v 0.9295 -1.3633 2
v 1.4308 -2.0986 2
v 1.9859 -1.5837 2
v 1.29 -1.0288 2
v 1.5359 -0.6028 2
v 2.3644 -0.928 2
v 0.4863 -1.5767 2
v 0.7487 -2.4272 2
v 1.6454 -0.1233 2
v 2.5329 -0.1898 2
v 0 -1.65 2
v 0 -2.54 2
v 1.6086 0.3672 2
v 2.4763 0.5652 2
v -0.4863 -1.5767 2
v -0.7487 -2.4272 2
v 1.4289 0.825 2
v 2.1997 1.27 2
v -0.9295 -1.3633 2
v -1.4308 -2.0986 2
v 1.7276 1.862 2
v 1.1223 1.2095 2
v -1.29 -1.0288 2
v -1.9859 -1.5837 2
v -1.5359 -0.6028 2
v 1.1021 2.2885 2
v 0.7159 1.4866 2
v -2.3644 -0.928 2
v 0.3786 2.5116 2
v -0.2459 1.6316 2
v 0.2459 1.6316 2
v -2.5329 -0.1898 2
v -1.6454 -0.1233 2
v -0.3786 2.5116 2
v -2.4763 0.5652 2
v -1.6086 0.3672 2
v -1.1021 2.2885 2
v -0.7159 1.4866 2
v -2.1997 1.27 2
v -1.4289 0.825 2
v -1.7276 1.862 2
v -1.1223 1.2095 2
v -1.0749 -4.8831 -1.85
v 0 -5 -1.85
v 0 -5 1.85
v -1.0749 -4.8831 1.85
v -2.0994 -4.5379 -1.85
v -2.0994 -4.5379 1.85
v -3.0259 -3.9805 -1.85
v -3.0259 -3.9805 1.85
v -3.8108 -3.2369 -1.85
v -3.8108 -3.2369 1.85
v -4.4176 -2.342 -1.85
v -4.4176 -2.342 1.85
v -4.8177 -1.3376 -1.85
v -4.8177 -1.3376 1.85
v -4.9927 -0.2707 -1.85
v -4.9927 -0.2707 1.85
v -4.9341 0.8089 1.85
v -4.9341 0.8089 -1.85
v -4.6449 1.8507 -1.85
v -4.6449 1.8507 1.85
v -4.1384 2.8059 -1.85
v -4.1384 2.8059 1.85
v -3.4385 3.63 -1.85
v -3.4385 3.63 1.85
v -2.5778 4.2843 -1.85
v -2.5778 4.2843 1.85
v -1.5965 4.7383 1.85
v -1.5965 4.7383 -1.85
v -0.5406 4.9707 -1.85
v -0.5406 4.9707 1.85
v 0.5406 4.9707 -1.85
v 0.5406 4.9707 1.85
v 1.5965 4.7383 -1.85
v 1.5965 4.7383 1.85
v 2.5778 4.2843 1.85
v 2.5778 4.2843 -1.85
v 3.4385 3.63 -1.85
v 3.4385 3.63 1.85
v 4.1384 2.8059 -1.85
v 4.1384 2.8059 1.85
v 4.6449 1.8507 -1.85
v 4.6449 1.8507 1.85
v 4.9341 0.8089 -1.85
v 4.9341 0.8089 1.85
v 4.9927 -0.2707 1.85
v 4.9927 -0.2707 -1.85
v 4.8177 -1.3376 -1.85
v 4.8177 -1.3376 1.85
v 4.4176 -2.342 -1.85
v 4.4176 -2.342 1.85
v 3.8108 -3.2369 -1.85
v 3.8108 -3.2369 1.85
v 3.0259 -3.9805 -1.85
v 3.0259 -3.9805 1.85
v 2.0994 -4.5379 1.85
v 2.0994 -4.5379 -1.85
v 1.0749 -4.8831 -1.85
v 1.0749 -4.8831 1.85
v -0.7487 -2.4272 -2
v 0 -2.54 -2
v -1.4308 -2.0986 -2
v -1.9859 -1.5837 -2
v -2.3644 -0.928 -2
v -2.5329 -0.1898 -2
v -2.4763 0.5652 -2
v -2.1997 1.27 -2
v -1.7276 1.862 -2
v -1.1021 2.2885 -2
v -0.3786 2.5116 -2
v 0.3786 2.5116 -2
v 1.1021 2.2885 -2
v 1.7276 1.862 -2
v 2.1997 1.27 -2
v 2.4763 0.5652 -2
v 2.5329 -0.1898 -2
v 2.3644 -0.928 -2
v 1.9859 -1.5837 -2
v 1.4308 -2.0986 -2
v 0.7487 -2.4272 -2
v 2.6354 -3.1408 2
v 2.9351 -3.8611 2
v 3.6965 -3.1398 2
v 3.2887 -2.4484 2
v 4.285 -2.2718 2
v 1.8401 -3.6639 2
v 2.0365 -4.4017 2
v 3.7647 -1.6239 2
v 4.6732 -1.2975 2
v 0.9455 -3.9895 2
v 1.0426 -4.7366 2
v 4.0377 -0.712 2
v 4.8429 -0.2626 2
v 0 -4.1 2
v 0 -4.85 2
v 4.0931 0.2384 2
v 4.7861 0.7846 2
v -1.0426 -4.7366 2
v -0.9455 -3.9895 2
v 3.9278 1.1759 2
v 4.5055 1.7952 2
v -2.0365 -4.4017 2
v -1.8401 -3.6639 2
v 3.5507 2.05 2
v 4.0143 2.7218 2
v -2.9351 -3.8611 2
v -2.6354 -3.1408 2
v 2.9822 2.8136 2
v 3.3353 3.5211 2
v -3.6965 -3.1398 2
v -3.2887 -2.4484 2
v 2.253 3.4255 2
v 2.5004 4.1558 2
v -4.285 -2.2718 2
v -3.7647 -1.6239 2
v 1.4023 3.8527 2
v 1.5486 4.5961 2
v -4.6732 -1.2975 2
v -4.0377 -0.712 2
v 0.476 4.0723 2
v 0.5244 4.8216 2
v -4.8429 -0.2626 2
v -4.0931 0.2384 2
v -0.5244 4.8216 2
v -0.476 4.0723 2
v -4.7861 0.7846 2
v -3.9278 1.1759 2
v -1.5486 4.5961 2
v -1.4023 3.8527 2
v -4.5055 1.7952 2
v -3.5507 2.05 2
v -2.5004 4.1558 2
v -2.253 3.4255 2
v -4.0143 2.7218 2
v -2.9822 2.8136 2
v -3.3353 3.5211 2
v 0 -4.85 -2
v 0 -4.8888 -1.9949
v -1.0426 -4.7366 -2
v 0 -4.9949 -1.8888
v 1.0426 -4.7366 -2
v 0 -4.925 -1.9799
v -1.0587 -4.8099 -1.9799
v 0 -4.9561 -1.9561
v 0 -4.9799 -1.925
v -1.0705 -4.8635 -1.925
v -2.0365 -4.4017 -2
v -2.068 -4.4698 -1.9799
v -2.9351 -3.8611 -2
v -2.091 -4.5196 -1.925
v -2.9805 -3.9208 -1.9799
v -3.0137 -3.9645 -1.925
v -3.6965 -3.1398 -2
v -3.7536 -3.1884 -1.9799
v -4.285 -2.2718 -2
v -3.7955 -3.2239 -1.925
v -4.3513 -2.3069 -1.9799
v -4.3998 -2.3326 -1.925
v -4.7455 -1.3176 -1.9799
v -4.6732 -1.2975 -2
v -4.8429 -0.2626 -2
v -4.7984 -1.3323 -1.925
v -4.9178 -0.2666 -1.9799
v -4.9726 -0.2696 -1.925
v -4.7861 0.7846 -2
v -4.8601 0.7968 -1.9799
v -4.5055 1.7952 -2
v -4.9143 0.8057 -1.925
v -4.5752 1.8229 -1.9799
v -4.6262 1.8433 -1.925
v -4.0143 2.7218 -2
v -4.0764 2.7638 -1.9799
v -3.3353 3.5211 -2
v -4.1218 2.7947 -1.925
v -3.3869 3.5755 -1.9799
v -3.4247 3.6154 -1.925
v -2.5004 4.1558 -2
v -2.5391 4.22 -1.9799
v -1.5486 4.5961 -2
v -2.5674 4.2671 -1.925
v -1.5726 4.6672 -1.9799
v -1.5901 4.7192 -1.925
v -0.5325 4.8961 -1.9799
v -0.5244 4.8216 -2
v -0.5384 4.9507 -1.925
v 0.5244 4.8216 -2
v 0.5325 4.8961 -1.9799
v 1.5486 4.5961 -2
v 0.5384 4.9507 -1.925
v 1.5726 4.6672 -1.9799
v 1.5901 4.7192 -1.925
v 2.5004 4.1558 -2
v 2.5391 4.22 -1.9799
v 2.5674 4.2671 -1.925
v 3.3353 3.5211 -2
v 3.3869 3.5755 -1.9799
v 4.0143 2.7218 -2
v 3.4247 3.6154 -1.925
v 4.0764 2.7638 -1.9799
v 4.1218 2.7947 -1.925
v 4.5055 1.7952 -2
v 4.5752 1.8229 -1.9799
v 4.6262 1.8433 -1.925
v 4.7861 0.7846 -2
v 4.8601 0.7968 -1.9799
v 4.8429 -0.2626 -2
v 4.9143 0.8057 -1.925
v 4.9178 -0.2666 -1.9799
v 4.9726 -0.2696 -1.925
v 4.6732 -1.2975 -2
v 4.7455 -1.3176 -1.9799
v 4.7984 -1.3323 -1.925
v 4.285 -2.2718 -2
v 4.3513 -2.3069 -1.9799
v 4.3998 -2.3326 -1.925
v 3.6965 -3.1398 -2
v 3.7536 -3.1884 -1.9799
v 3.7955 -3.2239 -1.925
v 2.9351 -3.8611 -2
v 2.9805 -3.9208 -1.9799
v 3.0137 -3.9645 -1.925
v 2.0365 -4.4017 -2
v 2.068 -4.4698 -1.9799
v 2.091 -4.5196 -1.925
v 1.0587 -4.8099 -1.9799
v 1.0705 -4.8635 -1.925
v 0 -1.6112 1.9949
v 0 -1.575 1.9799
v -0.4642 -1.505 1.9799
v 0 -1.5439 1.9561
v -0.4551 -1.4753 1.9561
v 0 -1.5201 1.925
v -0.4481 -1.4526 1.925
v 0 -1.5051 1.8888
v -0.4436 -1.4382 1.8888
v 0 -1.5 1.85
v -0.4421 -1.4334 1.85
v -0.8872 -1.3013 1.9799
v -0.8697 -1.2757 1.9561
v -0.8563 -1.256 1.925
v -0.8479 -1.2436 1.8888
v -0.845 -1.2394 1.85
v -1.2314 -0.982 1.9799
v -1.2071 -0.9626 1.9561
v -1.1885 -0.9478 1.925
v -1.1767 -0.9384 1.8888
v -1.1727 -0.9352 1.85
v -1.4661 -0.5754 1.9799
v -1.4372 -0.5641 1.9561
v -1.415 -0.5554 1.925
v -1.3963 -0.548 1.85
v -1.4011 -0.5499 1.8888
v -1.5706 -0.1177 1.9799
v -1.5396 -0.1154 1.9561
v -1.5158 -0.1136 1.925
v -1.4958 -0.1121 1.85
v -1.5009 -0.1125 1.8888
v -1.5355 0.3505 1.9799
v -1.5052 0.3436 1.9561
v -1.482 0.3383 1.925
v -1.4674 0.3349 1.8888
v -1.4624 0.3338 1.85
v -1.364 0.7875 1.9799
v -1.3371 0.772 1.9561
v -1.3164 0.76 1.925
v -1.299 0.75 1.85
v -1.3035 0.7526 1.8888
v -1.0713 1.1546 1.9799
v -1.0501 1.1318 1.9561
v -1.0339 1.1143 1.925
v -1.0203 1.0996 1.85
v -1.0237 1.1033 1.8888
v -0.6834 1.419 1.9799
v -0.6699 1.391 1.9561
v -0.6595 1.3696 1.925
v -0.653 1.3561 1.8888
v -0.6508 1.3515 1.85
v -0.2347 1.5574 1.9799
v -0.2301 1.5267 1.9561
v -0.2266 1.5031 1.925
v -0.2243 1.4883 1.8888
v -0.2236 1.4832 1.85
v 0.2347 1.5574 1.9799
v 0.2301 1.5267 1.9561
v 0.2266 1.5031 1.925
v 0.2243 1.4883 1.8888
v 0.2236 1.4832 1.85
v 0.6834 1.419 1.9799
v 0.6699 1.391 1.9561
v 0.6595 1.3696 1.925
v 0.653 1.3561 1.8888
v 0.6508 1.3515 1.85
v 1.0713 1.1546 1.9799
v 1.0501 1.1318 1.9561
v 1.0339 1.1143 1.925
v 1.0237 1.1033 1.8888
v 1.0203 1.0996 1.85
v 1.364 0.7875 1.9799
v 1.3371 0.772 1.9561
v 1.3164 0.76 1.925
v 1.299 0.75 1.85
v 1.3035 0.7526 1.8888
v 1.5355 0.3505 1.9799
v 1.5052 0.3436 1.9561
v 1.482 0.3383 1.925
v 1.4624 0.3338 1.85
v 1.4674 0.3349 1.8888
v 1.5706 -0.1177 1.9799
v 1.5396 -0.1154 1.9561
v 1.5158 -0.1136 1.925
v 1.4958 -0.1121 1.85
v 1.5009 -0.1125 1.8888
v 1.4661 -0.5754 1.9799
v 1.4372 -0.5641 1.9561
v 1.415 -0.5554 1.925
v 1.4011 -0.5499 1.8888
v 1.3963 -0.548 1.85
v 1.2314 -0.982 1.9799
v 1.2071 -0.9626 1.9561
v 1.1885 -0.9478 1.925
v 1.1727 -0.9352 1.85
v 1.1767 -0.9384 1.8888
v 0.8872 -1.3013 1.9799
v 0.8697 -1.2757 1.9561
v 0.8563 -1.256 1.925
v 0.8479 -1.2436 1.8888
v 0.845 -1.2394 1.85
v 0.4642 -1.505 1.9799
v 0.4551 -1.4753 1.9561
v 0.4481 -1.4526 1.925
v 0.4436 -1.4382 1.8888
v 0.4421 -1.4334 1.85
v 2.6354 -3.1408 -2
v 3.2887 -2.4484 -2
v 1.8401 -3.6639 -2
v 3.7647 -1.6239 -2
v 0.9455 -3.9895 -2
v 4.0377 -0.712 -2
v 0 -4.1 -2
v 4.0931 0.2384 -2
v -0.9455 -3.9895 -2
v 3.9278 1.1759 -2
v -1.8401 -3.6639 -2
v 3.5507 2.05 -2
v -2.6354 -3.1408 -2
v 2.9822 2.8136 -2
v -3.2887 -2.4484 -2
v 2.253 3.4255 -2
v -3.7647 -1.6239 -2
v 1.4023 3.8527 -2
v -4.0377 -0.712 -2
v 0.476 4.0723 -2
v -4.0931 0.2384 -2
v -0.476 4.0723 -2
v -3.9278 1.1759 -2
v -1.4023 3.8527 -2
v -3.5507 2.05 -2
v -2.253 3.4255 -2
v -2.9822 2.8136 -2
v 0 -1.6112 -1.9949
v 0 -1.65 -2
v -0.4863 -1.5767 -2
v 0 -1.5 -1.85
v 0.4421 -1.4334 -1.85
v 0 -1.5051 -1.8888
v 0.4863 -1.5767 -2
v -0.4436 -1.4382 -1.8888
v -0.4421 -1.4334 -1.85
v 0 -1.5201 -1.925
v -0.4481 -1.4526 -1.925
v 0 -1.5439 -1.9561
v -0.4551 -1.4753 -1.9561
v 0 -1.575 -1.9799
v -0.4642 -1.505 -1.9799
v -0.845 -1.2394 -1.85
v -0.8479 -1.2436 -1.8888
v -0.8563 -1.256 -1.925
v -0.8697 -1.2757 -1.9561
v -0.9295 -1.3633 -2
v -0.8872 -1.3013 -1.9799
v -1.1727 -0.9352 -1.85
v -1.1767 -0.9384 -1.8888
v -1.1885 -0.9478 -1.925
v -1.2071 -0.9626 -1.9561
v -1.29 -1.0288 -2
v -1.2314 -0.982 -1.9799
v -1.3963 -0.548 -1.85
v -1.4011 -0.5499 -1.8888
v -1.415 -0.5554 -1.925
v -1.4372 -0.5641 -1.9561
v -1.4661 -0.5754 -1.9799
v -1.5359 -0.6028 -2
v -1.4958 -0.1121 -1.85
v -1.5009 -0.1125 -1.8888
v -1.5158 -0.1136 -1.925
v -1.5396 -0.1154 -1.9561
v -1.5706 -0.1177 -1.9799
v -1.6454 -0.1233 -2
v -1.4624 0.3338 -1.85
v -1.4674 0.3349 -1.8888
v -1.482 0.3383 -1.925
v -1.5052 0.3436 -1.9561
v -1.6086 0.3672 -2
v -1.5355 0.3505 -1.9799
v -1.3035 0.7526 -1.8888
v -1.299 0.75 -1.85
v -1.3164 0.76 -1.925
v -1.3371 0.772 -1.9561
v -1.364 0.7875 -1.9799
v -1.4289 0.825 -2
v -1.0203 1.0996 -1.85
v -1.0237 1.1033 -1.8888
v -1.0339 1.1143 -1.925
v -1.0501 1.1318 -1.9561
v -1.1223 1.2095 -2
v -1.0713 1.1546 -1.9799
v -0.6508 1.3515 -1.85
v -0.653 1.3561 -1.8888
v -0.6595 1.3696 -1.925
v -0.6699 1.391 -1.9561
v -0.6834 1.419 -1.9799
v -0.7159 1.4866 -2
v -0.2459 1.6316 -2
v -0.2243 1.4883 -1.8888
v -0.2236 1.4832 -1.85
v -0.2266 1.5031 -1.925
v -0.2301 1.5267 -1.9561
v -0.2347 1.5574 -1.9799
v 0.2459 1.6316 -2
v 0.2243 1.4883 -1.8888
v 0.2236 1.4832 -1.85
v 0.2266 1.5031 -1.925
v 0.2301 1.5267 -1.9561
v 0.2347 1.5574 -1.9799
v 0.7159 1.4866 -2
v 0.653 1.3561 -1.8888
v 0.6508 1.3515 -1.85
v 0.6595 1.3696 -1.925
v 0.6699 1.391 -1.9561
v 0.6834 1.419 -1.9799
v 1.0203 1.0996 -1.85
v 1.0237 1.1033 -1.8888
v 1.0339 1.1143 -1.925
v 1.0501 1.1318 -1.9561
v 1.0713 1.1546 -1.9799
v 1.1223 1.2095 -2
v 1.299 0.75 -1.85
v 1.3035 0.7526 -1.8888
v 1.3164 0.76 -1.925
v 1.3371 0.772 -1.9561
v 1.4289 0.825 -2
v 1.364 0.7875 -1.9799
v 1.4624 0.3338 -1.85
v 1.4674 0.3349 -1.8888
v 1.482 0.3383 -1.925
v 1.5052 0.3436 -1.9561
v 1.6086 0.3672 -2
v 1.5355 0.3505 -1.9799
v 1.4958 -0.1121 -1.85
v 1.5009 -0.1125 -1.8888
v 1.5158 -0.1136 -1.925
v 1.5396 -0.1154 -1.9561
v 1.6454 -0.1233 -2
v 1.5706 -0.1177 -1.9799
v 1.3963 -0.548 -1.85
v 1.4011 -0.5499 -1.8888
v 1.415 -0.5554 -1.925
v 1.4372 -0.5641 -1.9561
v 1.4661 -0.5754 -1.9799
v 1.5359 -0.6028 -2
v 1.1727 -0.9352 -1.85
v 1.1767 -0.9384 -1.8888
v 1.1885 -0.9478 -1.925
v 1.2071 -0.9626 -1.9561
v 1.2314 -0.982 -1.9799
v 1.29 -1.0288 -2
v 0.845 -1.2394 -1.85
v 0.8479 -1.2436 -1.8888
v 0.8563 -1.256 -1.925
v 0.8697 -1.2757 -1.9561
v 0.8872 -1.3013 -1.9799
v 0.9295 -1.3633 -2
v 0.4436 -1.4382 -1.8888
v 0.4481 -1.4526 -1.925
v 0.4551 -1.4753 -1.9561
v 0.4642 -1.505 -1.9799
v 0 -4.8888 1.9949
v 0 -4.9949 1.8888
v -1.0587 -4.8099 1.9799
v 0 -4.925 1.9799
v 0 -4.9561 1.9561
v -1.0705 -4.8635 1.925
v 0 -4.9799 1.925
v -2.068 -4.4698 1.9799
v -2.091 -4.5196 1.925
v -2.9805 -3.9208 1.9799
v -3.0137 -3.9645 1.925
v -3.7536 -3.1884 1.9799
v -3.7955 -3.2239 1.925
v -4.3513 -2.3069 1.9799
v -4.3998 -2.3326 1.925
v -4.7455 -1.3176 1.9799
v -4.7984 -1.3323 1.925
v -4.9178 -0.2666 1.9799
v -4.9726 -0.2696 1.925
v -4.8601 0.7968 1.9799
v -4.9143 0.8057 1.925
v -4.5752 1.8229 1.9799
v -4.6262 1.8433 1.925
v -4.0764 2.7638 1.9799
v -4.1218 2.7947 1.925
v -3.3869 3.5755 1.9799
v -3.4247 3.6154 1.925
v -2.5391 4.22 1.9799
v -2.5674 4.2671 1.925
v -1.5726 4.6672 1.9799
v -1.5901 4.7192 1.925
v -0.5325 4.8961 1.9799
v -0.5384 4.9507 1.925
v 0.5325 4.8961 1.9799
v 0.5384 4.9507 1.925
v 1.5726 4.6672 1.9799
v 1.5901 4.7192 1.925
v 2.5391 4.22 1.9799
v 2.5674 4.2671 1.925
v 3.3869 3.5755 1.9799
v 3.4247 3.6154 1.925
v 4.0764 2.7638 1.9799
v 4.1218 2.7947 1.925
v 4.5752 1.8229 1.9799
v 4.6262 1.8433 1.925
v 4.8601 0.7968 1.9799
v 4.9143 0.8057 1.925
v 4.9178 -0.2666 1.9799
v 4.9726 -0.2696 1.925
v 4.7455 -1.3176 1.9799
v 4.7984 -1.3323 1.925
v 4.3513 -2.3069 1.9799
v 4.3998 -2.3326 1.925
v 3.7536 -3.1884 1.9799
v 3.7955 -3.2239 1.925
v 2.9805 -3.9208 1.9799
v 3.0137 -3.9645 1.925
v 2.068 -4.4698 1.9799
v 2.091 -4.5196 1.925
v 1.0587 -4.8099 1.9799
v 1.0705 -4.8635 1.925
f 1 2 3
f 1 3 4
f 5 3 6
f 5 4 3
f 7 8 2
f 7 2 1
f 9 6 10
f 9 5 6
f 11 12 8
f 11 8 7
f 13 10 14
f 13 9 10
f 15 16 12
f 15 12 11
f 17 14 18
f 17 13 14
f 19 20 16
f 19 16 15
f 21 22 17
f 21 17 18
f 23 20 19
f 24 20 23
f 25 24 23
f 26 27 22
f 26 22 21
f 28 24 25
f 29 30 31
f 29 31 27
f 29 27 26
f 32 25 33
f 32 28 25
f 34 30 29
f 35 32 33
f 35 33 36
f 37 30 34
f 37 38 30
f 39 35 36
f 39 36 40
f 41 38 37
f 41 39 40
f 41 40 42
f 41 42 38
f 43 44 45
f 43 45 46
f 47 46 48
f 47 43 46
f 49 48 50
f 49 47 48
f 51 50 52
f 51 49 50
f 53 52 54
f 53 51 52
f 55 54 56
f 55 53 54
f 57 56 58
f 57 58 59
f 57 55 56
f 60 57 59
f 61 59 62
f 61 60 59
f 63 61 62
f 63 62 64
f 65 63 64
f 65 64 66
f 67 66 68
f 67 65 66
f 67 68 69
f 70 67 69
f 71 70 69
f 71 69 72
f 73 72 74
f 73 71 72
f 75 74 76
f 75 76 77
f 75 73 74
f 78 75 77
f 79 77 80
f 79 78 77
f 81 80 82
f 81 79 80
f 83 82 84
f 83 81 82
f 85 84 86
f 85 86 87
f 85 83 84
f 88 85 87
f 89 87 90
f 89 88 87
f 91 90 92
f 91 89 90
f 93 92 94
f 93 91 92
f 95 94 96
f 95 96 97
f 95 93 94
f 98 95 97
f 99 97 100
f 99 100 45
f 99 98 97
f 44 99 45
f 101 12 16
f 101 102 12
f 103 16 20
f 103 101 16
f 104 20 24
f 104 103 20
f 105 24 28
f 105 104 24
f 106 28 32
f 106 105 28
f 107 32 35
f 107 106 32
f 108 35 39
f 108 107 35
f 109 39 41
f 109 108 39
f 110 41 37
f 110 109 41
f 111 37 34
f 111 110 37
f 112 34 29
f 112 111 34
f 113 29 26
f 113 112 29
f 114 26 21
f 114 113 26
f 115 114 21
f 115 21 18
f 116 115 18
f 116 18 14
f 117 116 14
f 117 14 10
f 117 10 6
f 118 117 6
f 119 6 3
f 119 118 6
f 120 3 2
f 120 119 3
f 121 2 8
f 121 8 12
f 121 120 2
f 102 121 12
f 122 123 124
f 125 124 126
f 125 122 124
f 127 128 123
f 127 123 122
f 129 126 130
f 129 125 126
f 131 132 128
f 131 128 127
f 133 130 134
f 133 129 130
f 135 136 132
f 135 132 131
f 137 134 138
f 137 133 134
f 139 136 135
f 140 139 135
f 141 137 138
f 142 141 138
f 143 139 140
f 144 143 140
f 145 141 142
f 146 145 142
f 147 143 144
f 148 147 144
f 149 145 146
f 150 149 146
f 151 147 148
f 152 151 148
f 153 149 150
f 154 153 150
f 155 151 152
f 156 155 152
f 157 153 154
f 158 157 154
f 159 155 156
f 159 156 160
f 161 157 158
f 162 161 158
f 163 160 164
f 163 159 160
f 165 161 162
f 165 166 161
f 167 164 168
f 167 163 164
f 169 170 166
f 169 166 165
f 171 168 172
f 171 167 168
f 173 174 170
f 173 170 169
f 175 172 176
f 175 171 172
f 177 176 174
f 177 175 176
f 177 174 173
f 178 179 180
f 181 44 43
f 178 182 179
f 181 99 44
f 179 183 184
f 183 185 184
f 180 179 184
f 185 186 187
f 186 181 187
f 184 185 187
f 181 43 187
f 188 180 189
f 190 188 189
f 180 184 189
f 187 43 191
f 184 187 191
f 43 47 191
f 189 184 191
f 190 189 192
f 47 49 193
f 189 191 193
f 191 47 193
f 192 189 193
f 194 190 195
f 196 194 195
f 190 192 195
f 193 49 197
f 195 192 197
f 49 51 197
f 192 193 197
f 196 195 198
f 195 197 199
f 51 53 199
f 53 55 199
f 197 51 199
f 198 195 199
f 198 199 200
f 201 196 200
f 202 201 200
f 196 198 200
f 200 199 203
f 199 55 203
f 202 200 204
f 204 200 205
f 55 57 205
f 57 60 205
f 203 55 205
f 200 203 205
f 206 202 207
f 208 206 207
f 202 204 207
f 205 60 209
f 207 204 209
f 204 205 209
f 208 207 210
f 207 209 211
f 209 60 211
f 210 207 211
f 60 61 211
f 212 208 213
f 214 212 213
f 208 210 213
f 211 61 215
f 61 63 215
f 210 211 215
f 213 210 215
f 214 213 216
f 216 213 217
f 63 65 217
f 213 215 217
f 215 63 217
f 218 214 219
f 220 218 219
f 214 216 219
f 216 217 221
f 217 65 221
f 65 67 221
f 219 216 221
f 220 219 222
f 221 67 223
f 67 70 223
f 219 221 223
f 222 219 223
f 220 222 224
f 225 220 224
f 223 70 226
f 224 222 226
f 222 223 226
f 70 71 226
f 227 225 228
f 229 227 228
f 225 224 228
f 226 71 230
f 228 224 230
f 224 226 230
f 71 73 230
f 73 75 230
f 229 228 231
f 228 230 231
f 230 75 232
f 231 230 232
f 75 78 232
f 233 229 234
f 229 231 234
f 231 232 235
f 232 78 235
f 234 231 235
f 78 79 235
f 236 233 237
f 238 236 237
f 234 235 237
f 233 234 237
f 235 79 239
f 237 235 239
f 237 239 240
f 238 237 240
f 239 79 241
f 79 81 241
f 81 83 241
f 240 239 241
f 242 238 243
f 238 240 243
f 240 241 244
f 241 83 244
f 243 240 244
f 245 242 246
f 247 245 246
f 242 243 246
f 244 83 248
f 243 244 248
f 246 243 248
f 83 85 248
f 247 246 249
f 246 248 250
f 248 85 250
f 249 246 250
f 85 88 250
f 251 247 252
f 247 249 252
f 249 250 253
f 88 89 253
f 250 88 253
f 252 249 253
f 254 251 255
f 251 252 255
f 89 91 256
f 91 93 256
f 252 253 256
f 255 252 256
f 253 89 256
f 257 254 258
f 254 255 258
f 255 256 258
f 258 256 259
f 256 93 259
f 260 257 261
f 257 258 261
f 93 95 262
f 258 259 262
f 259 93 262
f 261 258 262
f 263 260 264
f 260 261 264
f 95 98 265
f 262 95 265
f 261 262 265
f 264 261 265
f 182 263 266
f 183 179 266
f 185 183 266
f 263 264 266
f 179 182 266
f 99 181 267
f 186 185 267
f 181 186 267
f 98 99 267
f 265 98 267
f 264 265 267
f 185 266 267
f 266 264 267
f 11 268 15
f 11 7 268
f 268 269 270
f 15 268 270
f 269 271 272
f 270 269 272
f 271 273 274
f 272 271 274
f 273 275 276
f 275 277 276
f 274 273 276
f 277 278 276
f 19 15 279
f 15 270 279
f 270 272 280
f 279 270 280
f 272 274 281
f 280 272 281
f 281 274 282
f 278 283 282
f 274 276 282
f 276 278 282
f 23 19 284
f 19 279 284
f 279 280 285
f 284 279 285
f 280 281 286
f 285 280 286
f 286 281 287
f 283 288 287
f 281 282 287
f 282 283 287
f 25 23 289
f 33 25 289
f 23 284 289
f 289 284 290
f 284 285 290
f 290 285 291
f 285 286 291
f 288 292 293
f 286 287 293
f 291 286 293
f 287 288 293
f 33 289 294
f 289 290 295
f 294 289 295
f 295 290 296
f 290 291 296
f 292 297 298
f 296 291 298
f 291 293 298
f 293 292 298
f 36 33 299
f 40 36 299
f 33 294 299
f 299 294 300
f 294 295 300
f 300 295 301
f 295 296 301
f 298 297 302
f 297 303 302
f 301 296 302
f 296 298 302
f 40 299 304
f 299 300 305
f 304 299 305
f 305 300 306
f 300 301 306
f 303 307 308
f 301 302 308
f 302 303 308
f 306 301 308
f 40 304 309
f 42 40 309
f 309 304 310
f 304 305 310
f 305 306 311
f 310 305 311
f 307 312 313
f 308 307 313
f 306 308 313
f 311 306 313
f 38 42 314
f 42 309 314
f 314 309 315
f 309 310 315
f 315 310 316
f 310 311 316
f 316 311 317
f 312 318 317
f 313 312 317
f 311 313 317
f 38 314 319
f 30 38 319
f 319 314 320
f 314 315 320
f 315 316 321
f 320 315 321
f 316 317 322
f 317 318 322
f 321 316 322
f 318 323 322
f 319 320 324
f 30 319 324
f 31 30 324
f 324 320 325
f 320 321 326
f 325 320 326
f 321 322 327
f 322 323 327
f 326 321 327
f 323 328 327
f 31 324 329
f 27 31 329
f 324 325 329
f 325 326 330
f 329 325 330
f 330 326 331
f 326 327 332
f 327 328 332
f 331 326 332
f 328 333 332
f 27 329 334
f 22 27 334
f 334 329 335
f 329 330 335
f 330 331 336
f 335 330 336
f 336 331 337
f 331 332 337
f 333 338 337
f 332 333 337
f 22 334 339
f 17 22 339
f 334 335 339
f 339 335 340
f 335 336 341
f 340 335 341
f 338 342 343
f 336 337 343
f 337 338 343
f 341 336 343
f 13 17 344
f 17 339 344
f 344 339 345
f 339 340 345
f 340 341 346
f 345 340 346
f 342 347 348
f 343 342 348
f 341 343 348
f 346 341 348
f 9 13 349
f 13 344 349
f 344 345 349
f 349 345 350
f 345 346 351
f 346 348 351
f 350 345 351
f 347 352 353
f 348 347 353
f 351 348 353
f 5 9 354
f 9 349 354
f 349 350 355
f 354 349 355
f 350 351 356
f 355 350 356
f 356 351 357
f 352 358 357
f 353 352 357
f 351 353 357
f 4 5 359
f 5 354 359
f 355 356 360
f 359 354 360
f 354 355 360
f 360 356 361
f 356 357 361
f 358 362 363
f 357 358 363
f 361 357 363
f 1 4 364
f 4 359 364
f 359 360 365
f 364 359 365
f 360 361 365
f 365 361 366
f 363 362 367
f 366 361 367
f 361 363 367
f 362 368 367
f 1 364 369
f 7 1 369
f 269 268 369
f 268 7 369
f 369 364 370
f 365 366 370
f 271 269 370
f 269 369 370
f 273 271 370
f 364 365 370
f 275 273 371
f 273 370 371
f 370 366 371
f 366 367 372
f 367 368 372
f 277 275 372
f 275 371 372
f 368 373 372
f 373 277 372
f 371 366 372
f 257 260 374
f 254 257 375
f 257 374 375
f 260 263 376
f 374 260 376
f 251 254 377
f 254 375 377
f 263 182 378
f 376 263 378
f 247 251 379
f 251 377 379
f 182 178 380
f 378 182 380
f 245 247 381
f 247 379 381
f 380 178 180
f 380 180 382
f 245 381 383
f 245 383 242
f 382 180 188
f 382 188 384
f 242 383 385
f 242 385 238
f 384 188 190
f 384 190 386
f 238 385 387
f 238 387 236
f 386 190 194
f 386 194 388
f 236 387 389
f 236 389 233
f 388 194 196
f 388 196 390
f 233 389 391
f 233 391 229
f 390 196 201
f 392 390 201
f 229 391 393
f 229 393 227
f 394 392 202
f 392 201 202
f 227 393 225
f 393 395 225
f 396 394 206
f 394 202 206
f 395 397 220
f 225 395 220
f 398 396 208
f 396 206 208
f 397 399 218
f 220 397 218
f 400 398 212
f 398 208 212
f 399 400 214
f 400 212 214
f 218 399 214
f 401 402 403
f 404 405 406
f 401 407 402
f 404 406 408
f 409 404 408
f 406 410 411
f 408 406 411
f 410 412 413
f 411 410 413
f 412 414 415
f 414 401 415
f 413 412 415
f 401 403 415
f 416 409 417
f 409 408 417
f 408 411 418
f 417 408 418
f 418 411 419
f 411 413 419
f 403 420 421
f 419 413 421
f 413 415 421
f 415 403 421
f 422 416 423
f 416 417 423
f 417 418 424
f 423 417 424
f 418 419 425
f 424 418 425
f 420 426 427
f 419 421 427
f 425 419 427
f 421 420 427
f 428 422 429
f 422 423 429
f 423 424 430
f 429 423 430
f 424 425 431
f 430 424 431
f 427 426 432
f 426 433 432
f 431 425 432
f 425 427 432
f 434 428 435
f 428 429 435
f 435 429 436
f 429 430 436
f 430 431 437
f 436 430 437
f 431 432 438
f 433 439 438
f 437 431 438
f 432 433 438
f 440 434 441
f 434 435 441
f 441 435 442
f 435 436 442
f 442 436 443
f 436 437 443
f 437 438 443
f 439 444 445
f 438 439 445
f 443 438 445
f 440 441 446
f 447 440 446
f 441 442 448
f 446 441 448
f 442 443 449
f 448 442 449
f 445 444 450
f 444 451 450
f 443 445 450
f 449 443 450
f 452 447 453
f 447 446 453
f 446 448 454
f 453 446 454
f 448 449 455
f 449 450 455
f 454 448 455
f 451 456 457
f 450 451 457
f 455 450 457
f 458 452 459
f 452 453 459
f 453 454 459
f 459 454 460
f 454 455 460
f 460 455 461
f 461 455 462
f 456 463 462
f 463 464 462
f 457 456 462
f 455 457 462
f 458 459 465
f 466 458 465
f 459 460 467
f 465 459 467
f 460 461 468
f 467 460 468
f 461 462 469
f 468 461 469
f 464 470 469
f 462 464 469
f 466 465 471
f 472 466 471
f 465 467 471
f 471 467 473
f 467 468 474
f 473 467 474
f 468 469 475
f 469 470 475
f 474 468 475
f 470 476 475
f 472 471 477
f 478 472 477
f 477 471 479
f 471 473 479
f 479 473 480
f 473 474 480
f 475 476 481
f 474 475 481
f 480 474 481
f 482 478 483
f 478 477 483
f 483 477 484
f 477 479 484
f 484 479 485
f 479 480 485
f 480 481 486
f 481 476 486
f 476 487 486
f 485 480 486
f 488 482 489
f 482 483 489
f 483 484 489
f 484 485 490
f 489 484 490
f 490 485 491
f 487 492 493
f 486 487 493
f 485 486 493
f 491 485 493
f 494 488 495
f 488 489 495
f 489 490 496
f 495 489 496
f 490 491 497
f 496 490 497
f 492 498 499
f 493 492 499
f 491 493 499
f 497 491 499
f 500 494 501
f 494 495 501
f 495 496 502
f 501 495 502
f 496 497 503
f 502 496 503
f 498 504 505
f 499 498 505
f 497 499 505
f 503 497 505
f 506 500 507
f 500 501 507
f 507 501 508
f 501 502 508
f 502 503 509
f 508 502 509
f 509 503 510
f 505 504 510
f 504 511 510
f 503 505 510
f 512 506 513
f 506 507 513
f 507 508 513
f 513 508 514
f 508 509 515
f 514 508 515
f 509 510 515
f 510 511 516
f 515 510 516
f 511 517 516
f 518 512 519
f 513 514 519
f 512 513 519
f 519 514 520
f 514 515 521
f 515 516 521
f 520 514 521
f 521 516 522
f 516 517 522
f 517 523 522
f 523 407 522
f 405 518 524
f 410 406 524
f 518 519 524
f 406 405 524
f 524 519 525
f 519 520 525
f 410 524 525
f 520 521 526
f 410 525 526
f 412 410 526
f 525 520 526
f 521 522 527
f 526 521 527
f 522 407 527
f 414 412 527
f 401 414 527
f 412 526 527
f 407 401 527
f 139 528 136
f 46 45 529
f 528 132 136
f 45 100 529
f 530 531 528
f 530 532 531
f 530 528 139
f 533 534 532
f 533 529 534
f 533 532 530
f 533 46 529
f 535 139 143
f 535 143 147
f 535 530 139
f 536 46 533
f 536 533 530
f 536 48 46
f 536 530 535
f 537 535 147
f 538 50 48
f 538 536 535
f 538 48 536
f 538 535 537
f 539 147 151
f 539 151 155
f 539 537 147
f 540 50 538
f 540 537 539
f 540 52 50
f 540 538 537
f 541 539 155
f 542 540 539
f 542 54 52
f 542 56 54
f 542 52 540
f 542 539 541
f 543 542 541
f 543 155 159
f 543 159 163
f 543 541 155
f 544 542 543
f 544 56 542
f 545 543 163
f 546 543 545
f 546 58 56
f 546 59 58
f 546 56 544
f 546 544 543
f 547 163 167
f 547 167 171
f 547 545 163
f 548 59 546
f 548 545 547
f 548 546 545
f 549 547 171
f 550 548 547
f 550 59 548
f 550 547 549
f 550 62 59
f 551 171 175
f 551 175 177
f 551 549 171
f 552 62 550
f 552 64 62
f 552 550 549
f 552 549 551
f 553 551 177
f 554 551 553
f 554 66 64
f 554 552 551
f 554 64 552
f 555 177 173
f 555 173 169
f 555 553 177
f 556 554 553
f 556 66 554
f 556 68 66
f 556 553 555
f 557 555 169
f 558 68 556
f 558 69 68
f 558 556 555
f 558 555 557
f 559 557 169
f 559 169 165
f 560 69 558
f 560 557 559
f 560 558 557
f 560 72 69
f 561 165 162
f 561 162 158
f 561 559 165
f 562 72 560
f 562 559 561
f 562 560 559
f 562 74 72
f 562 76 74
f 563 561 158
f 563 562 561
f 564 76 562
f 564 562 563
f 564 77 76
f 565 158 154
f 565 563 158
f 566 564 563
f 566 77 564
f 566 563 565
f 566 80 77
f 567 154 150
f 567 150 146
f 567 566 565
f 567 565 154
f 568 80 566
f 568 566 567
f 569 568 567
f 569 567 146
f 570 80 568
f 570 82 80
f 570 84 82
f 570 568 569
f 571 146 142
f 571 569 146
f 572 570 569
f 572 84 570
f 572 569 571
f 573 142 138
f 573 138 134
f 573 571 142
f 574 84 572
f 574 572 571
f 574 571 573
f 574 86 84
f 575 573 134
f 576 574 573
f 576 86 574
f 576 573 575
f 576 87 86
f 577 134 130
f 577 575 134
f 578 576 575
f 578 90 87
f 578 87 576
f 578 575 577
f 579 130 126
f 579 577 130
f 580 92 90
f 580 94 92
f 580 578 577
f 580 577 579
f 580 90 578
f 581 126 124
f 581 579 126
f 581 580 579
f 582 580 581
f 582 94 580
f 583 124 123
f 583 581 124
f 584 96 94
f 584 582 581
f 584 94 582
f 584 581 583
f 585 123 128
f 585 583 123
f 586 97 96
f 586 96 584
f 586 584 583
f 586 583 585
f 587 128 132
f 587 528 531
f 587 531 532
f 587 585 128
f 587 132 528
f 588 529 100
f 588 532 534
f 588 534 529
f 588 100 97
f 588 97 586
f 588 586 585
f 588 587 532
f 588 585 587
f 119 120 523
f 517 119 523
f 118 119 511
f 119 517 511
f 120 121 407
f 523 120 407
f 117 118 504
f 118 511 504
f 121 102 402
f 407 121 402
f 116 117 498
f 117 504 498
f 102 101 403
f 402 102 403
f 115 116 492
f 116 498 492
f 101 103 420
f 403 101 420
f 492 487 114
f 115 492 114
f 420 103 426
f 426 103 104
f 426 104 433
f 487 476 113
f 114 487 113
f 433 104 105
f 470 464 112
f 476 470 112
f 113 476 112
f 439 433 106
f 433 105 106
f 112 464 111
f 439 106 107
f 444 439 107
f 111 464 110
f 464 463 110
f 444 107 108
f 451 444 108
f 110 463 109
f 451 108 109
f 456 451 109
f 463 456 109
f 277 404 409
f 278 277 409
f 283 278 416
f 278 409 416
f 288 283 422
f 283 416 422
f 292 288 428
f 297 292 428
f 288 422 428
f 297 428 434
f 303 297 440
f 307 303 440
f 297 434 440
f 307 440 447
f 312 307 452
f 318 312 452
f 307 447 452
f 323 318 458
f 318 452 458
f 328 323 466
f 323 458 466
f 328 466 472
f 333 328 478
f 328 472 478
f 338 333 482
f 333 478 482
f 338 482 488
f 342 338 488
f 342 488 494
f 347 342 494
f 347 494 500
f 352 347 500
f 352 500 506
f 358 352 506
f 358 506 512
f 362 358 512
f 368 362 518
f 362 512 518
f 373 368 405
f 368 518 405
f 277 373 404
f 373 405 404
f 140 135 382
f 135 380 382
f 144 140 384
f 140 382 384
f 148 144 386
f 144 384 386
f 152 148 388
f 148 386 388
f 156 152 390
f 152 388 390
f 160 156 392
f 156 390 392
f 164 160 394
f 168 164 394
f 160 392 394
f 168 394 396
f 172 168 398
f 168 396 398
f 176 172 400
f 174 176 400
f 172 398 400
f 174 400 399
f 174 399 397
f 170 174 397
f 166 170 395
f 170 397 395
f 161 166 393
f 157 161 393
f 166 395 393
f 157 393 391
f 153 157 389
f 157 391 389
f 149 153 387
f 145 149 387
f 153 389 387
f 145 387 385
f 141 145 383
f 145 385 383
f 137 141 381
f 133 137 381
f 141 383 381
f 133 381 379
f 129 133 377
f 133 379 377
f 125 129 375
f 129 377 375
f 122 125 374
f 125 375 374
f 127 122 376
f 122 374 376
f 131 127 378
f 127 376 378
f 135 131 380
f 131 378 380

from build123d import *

# Parameters (mm, degrees)
SKETCH1_W   = 4
SKETCH1_H   = 0.9
SKETCH1_H_2 = 1.04
FILLET1_R   = 0.15
FILLET2_R   = 0.15


with BuildPart() as part:
    # Sketch1 → Revolve1 (revolve)
    with BuildSketch(Plane(origin=(0, 0, 0), x_dir=(0, 0, -1), z_dir=(1, 0, 0)), mode=Mode.PRIVATE) as revolve1_sk:
        with Locations((0, 4.55)):
            Rectangle(SKETCH1_W, SKETCH1_H)
        with Locations((0, 2.02)):
            Rectangle(SKETCH1_W, SKETCH1_H_2)
    revolve(revolve1_sk.sketch.rotate(Axis((0, 0, 2), (0, 0, -1)), 180), axis=Axis((0, 0, 2), (0, 0, -1)))

    # Fillet1
    fillet1_edges = [part.edges().sort_by_distance(p)[0] for p in [
        (0, 5, 2),
        (0, 5, -2),
    ]]
    fillet(fillet1_edges, radius=FILLET1_R)

    # Fillet2
    fillet2_edges = [part.edges().sort_by_distance(p)[0] for p in [
        (0, 1.5, -2),
        (0, 1.5, 2),
    ]]
    fillet(fillet2_edges, radius=FILLET2_R)


solid = part.part
